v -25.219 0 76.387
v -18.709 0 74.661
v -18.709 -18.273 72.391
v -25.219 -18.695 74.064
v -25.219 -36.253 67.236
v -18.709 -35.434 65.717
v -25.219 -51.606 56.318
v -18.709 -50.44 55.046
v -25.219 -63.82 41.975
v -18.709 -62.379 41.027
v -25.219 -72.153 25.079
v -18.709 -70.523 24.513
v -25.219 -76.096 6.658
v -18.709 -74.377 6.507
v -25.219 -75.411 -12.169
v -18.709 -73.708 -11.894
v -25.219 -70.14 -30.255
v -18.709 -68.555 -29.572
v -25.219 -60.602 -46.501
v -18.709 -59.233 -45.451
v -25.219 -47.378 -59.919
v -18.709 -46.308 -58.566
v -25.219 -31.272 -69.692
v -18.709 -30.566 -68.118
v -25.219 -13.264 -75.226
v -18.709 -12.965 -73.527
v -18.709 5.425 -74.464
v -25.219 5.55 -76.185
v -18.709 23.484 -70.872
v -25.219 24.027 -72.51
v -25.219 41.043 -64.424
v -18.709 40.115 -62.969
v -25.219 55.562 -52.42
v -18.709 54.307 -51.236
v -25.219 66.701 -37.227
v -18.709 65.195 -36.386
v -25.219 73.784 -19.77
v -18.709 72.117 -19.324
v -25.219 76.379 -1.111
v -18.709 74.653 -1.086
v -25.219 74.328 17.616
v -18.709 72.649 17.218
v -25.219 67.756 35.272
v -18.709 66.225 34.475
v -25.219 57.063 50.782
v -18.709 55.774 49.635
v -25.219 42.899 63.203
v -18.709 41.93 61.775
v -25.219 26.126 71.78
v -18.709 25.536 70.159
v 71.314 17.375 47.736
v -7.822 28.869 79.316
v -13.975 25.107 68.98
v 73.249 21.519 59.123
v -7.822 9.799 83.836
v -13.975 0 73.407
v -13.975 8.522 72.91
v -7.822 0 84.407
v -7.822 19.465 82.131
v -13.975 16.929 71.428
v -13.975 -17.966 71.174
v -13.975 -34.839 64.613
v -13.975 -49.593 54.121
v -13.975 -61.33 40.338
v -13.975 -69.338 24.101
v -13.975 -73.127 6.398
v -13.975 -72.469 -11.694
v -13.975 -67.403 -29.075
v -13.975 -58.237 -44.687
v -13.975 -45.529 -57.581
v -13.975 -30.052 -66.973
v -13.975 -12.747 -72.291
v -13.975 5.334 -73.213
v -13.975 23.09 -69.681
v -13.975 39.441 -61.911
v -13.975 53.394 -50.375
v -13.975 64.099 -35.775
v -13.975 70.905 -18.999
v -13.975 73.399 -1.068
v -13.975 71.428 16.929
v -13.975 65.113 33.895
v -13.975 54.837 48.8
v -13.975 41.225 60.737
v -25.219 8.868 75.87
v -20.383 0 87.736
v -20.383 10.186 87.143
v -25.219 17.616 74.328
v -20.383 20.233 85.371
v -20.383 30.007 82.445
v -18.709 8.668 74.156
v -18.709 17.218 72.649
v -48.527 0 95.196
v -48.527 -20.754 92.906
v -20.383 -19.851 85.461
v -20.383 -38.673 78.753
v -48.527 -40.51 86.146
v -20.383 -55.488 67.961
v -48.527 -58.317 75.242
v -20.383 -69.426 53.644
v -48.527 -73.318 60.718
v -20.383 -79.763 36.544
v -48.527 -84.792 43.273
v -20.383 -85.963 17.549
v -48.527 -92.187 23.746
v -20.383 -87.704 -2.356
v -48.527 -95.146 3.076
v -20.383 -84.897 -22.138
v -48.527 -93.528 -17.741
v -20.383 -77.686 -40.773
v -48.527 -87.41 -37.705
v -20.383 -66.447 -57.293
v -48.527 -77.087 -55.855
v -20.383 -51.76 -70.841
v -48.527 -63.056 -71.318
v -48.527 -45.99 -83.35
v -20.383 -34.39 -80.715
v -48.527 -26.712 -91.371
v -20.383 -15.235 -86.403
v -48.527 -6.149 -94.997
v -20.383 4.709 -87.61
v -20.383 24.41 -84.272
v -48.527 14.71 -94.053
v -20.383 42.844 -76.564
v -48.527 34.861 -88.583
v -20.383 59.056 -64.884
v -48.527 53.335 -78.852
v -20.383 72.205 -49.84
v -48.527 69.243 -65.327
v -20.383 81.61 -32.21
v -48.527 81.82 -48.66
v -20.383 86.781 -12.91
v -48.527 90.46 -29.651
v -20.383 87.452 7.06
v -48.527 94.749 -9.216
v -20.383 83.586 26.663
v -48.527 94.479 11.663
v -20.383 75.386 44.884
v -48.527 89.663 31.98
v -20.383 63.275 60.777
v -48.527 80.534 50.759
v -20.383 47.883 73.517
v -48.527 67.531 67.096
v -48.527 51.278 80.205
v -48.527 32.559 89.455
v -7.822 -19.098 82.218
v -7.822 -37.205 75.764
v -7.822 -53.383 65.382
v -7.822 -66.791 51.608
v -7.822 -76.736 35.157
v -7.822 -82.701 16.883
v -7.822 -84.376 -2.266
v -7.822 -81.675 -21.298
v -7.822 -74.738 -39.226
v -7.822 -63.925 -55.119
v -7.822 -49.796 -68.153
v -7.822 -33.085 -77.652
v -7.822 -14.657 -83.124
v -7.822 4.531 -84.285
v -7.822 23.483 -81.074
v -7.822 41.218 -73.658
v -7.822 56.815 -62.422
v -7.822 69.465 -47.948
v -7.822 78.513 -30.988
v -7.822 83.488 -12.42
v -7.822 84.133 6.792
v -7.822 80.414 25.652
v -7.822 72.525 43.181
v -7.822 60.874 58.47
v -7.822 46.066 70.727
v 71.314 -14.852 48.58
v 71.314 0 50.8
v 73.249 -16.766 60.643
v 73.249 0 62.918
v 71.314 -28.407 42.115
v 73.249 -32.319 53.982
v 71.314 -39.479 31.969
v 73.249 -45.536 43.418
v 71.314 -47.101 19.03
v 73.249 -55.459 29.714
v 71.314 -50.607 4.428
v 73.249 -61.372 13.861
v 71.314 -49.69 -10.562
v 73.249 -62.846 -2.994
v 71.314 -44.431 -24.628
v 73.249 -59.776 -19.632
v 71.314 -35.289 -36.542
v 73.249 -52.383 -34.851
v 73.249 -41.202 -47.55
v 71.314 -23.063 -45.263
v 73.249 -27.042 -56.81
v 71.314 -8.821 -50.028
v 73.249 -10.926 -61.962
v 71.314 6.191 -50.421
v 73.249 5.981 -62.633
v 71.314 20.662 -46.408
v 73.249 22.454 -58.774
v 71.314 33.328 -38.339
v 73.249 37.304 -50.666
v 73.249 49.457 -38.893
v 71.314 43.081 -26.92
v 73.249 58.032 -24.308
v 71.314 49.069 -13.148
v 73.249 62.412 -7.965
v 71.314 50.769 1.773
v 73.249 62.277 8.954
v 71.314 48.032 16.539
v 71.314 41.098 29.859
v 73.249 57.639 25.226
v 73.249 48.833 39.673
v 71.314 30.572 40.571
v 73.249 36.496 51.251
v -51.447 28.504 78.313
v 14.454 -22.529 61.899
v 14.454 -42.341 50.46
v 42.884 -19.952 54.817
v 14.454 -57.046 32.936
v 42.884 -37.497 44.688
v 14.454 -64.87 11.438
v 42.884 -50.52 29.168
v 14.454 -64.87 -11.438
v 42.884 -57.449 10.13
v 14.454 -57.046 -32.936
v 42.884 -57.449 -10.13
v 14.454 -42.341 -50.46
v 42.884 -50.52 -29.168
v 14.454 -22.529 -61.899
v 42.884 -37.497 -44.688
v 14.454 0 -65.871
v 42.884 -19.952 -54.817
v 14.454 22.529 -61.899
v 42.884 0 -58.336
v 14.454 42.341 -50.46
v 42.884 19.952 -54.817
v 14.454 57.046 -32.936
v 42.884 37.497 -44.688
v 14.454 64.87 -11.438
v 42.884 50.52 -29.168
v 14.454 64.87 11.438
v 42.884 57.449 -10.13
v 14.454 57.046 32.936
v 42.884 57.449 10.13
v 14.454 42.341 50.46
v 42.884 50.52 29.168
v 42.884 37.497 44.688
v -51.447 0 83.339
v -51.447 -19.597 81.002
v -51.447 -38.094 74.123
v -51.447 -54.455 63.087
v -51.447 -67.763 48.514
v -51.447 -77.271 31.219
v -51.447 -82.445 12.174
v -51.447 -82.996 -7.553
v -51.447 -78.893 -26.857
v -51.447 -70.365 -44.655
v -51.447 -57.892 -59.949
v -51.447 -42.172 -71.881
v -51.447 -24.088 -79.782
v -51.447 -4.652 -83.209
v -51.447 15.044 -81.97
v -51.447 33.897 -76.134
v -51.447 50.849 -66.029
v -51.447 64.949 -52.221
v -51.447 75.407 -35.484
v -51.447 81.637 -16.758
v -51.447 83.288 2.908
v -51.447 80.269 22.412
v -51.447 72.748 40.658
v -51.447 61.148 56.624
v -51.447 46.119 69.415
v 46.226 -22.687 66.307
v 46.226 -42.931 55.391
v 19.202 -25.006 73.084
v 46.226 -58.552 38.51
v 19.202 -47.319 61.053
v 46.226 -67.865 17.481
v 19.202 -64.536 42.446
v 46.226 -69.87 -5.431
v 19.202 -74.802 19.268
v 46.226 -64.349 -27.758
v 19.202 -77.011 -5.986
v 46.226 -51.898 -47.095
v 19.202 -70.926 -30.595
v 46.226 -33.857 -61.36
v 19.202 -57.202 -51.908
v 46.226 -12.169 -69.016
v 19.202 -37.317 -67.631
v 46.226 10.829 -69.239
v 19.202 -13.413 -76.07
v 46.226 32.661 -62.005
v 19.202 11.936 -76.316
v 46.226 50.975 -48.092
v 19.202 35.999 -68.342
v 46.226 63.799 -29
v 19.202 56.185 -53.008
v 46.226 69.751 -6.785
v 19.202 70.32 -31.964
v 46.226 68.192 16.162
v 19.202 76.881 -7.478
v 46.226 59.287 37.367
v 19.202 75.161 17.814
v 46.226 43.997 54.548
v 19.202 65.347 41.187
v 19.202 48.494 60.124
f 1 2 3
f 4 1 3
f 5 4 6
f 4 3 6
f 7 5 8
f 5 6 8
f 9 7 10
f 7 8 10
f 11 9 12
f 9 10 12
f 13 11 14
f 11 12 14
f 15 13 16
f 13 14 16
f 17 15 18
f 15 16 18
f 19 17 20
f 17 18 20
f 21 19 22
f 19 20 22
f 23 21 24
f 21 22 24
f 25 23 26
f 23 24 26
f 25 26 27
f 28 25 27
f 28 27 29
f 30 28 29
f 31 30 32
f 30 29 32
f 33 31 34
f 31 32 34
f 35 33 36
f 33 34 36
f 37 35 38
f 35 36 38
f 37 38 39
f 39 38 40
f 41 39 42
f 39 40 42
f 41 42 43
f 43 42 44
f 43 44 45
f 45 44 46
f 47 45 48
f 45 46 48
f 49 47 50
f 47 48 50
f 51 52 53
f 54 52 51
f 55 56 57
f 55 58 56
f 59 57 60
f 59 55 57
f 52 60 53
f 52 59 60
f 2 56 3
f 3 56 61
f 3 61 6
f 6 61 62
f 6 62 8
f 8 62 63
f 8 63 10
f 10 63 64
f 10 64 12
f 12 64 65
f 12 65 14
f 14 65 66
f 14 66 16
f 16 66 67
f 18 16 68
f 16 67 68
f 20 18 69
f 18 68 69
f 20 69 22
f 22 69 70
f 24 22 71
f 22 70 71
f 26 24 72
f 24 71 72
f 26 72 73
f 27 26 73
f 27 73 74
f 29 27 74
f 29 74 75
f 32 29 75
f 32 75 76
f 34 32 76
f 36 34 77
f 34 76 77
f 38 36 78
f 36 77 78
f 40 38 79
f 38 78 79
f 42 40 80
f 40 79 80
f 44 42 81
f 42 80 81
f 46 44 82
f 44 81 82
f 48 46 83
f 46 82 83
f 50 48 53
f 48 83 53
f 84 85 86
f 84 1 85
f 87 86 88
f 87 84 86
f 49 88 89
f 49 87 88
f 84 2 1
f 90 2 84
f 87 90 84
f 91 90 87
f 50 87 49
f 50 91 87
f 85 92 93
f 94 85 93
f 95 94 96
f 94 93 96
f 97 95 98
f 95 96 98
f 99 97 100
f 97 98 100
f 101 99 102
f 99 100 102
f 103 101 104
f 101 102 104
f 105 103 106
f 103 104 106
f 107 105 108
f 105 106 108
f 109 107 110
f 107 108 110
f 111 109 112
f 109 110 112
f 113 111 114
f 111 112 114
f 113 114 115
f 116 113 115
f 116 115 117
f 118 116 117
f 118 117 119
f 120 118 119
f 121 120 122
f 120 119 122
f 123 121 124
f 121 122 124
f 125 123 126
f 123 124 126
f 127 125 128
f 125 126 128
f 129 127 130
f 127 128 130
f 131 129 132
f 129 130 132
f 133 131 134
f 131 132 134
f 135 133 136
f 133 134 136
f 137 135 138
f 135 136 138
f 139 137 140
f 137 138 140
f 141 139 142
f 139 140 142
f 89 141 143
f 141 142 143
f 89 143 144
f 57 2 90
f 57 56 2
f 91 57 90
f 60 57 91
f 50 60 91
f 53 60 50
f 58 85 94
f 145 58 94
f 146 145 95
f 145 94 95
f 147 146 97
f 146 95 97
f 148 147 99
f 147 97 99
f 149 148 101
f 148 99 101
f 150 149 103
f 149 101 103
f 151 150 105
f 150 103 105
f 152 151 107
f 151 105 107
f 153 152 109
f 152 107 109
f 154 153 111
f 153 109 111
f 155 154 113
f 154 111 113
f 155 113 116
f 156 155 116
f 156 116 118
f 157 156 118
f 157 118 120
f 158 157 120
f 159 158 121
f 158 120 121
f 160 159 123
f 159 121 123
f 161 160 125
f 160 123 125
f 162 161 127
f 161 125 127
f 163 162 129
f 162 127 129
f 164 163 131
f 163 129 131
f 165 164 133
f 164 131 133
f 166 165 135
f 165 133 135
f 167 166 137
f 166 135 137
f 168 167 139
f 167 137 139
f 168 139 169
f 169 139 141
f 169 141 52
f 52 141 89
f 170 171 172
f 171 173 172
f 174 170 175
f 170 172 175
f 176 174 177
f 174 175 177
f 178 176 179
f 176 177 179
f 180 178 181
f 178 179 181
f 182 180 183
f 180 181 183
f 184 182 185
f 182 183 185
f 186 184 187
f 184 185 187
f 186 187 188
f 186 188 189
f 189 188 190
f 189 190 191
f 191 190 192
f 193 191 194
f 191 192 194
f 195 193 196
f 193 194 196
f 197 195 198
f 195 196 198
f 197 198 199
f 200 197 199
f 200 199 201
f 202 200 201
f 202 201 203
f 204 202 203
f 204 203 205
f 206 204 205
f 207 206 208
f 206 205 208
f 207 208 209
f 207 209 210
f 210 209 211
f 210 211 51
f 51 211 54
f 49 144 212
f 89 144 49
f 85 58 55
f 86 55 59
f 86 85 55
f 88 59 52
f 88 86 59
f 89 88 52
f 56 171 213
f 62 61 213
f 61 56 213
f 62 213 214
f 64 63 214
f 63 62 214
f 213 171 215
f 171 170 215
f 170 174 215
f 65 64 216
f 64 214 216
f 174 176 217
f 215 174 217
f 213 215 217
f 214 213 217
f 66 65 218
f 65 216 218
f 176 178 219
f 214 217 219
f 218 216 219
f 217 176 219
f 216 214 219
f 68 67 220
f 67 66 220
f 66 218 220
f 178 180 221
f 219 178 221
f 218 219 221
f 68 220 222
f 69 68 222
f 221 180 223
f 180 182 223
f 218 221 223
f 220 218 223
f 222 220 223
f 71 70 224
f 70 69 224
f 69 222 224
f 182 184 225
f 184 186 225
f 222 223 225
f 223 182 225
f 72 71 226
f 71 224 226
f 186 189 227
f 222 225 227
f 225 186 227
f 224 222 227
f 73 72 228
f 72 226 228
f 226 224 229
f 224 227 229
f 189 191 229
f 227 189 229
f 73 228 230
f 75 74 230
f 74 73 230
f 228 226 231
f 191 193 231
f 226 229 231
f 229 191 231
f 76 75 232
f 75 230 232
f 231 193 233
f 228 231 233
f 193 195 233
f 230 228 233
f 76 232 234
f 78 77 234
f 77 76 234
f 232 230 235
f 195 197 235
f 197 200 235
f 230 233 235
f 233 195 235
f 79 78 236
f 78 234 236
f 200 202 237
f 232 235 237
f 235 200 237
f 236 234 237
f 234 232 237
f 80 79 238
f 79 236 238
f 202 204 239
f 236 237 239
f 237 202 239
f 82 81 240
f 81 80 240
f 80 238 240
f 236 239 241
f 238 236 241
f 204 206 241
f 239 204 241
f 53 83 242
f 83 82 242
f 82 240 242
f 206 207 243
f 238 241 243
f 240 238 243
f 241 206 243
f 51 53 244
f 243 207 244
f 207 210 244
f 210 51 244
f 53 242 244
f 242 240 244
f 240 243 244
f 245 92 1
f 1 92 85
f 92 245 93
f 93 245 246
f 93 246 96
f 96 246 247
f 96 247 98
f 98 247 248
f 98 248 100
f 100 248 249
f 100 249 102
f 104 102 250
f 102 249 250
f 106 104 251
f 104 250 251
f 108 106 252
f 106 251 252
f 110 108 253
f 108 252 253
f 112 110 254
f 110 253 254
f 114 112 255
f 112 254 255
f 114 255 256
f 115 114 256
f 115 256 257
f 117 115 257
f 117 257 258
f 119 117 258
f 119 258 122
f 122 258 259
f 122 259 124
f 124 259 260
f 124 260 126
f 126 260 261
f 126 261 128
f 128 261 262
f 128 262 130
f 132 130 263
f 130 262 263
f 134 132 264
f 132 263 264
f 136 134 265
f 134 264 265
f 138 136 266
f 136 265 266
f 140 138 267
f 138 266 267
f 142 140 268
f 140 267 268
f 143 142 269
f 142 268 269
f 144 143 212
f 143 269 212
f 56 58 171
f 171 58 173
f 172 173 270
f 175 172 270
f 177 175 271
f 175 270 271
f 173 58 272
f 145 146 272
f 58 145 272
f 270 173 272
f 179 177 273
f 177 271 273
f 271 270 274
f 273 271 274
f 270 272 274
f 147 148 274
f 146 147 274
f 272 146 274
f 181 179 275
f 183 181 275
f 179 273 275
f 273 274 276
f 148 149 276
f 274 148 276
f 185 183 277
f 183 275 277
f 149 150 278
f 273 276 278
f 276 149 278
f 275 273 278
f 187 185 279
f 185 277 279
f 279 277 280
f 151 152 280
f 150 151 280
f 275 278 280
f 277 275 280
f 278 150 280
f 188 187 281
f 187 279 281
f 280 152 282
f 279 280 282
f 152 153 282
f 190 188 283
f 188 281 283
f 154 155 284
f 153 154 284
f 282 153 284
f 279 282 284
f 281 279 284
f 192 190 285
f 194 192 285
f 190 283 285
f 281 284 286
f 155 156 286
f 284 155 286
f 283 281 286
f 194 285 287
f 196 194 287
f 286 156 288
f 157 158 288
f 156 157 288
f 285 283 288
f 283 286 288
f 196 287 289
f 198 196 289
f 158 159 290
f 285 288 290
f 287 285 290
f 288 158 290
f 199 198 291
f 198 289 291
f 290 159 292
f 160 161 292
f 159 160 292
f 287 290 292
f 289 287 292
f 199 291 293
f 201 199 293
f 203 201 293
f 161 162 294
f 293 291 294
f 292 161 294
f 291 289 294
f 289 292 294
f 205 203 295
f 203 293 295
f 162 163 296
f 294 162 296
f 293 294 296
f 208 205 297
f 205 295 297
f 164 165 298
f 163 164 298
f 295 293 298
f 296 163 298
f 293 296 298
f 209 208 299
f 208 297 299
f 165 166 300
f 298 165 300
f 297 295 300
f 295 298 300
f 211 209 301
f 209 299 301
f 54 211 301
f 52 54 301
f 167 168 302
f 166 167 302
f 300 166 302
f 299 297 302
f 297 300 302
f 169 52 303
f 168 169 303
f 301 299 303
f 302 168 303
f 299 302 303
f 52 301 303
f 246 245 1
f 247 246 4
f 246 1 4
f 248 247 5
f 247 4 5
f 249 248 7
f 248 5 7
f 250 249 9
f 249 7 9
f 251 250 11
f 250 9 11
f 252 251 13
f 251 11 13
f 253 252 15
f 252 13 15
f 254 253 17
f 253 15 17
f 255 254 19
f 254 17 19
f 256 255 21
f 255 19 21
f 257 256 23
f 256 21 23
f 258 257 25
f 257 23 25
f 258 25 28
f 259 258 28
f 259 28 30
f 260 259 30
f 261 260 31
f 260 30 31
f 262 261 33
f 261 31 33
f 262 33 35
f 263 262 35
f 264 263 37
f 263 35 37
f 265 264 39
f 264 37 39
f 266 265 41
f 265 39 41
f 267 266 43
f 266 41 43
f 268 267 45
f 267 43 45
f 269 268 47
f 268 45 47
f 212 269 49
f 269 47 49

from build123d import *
from build123d import SkipClean  # not in build123d's __all__

# Parameters (mm, degrees)
F1_ANGLE = 340


with BuildPart() as f1:
    # F0 (on Front) → F1 (revolve)
    with BuildSketch(Plane.XZ):
        Polygon((-48.5273150222, 95.1958908392), (-51.4471201788, 83.3390055934), (71.3136761488, 50.8), (73.2494630124, 62.9177093663), align=None)
    revolve(axis=Axis((3.1582843512, 0, 0), (1, 0, 0)), revolution_arc=F1_ANGLE)

    # F2 (on face) → F3 (revolve)
    with BuildSketch(Plane(origin=(0, 0, 0), x_dir=(1, 0, 0), z_dir=(0, -0.9396926208, 0.3420201433))):
        Polygon((-7.8220407683, 84.4065412565), (-20.3833373413, 87.7360414852), (-25.218585377, 76.3868639802), (-13.9751803482, 73.4066843946), align=None)
    with SkipClean():  # cleaning this boolean's faces spoils the solid; the shape is the same uncleaned
        revolve(axis=Axis((73.2494630124, 0, 0), (-1, 0, 0)))


solid = f1.part
